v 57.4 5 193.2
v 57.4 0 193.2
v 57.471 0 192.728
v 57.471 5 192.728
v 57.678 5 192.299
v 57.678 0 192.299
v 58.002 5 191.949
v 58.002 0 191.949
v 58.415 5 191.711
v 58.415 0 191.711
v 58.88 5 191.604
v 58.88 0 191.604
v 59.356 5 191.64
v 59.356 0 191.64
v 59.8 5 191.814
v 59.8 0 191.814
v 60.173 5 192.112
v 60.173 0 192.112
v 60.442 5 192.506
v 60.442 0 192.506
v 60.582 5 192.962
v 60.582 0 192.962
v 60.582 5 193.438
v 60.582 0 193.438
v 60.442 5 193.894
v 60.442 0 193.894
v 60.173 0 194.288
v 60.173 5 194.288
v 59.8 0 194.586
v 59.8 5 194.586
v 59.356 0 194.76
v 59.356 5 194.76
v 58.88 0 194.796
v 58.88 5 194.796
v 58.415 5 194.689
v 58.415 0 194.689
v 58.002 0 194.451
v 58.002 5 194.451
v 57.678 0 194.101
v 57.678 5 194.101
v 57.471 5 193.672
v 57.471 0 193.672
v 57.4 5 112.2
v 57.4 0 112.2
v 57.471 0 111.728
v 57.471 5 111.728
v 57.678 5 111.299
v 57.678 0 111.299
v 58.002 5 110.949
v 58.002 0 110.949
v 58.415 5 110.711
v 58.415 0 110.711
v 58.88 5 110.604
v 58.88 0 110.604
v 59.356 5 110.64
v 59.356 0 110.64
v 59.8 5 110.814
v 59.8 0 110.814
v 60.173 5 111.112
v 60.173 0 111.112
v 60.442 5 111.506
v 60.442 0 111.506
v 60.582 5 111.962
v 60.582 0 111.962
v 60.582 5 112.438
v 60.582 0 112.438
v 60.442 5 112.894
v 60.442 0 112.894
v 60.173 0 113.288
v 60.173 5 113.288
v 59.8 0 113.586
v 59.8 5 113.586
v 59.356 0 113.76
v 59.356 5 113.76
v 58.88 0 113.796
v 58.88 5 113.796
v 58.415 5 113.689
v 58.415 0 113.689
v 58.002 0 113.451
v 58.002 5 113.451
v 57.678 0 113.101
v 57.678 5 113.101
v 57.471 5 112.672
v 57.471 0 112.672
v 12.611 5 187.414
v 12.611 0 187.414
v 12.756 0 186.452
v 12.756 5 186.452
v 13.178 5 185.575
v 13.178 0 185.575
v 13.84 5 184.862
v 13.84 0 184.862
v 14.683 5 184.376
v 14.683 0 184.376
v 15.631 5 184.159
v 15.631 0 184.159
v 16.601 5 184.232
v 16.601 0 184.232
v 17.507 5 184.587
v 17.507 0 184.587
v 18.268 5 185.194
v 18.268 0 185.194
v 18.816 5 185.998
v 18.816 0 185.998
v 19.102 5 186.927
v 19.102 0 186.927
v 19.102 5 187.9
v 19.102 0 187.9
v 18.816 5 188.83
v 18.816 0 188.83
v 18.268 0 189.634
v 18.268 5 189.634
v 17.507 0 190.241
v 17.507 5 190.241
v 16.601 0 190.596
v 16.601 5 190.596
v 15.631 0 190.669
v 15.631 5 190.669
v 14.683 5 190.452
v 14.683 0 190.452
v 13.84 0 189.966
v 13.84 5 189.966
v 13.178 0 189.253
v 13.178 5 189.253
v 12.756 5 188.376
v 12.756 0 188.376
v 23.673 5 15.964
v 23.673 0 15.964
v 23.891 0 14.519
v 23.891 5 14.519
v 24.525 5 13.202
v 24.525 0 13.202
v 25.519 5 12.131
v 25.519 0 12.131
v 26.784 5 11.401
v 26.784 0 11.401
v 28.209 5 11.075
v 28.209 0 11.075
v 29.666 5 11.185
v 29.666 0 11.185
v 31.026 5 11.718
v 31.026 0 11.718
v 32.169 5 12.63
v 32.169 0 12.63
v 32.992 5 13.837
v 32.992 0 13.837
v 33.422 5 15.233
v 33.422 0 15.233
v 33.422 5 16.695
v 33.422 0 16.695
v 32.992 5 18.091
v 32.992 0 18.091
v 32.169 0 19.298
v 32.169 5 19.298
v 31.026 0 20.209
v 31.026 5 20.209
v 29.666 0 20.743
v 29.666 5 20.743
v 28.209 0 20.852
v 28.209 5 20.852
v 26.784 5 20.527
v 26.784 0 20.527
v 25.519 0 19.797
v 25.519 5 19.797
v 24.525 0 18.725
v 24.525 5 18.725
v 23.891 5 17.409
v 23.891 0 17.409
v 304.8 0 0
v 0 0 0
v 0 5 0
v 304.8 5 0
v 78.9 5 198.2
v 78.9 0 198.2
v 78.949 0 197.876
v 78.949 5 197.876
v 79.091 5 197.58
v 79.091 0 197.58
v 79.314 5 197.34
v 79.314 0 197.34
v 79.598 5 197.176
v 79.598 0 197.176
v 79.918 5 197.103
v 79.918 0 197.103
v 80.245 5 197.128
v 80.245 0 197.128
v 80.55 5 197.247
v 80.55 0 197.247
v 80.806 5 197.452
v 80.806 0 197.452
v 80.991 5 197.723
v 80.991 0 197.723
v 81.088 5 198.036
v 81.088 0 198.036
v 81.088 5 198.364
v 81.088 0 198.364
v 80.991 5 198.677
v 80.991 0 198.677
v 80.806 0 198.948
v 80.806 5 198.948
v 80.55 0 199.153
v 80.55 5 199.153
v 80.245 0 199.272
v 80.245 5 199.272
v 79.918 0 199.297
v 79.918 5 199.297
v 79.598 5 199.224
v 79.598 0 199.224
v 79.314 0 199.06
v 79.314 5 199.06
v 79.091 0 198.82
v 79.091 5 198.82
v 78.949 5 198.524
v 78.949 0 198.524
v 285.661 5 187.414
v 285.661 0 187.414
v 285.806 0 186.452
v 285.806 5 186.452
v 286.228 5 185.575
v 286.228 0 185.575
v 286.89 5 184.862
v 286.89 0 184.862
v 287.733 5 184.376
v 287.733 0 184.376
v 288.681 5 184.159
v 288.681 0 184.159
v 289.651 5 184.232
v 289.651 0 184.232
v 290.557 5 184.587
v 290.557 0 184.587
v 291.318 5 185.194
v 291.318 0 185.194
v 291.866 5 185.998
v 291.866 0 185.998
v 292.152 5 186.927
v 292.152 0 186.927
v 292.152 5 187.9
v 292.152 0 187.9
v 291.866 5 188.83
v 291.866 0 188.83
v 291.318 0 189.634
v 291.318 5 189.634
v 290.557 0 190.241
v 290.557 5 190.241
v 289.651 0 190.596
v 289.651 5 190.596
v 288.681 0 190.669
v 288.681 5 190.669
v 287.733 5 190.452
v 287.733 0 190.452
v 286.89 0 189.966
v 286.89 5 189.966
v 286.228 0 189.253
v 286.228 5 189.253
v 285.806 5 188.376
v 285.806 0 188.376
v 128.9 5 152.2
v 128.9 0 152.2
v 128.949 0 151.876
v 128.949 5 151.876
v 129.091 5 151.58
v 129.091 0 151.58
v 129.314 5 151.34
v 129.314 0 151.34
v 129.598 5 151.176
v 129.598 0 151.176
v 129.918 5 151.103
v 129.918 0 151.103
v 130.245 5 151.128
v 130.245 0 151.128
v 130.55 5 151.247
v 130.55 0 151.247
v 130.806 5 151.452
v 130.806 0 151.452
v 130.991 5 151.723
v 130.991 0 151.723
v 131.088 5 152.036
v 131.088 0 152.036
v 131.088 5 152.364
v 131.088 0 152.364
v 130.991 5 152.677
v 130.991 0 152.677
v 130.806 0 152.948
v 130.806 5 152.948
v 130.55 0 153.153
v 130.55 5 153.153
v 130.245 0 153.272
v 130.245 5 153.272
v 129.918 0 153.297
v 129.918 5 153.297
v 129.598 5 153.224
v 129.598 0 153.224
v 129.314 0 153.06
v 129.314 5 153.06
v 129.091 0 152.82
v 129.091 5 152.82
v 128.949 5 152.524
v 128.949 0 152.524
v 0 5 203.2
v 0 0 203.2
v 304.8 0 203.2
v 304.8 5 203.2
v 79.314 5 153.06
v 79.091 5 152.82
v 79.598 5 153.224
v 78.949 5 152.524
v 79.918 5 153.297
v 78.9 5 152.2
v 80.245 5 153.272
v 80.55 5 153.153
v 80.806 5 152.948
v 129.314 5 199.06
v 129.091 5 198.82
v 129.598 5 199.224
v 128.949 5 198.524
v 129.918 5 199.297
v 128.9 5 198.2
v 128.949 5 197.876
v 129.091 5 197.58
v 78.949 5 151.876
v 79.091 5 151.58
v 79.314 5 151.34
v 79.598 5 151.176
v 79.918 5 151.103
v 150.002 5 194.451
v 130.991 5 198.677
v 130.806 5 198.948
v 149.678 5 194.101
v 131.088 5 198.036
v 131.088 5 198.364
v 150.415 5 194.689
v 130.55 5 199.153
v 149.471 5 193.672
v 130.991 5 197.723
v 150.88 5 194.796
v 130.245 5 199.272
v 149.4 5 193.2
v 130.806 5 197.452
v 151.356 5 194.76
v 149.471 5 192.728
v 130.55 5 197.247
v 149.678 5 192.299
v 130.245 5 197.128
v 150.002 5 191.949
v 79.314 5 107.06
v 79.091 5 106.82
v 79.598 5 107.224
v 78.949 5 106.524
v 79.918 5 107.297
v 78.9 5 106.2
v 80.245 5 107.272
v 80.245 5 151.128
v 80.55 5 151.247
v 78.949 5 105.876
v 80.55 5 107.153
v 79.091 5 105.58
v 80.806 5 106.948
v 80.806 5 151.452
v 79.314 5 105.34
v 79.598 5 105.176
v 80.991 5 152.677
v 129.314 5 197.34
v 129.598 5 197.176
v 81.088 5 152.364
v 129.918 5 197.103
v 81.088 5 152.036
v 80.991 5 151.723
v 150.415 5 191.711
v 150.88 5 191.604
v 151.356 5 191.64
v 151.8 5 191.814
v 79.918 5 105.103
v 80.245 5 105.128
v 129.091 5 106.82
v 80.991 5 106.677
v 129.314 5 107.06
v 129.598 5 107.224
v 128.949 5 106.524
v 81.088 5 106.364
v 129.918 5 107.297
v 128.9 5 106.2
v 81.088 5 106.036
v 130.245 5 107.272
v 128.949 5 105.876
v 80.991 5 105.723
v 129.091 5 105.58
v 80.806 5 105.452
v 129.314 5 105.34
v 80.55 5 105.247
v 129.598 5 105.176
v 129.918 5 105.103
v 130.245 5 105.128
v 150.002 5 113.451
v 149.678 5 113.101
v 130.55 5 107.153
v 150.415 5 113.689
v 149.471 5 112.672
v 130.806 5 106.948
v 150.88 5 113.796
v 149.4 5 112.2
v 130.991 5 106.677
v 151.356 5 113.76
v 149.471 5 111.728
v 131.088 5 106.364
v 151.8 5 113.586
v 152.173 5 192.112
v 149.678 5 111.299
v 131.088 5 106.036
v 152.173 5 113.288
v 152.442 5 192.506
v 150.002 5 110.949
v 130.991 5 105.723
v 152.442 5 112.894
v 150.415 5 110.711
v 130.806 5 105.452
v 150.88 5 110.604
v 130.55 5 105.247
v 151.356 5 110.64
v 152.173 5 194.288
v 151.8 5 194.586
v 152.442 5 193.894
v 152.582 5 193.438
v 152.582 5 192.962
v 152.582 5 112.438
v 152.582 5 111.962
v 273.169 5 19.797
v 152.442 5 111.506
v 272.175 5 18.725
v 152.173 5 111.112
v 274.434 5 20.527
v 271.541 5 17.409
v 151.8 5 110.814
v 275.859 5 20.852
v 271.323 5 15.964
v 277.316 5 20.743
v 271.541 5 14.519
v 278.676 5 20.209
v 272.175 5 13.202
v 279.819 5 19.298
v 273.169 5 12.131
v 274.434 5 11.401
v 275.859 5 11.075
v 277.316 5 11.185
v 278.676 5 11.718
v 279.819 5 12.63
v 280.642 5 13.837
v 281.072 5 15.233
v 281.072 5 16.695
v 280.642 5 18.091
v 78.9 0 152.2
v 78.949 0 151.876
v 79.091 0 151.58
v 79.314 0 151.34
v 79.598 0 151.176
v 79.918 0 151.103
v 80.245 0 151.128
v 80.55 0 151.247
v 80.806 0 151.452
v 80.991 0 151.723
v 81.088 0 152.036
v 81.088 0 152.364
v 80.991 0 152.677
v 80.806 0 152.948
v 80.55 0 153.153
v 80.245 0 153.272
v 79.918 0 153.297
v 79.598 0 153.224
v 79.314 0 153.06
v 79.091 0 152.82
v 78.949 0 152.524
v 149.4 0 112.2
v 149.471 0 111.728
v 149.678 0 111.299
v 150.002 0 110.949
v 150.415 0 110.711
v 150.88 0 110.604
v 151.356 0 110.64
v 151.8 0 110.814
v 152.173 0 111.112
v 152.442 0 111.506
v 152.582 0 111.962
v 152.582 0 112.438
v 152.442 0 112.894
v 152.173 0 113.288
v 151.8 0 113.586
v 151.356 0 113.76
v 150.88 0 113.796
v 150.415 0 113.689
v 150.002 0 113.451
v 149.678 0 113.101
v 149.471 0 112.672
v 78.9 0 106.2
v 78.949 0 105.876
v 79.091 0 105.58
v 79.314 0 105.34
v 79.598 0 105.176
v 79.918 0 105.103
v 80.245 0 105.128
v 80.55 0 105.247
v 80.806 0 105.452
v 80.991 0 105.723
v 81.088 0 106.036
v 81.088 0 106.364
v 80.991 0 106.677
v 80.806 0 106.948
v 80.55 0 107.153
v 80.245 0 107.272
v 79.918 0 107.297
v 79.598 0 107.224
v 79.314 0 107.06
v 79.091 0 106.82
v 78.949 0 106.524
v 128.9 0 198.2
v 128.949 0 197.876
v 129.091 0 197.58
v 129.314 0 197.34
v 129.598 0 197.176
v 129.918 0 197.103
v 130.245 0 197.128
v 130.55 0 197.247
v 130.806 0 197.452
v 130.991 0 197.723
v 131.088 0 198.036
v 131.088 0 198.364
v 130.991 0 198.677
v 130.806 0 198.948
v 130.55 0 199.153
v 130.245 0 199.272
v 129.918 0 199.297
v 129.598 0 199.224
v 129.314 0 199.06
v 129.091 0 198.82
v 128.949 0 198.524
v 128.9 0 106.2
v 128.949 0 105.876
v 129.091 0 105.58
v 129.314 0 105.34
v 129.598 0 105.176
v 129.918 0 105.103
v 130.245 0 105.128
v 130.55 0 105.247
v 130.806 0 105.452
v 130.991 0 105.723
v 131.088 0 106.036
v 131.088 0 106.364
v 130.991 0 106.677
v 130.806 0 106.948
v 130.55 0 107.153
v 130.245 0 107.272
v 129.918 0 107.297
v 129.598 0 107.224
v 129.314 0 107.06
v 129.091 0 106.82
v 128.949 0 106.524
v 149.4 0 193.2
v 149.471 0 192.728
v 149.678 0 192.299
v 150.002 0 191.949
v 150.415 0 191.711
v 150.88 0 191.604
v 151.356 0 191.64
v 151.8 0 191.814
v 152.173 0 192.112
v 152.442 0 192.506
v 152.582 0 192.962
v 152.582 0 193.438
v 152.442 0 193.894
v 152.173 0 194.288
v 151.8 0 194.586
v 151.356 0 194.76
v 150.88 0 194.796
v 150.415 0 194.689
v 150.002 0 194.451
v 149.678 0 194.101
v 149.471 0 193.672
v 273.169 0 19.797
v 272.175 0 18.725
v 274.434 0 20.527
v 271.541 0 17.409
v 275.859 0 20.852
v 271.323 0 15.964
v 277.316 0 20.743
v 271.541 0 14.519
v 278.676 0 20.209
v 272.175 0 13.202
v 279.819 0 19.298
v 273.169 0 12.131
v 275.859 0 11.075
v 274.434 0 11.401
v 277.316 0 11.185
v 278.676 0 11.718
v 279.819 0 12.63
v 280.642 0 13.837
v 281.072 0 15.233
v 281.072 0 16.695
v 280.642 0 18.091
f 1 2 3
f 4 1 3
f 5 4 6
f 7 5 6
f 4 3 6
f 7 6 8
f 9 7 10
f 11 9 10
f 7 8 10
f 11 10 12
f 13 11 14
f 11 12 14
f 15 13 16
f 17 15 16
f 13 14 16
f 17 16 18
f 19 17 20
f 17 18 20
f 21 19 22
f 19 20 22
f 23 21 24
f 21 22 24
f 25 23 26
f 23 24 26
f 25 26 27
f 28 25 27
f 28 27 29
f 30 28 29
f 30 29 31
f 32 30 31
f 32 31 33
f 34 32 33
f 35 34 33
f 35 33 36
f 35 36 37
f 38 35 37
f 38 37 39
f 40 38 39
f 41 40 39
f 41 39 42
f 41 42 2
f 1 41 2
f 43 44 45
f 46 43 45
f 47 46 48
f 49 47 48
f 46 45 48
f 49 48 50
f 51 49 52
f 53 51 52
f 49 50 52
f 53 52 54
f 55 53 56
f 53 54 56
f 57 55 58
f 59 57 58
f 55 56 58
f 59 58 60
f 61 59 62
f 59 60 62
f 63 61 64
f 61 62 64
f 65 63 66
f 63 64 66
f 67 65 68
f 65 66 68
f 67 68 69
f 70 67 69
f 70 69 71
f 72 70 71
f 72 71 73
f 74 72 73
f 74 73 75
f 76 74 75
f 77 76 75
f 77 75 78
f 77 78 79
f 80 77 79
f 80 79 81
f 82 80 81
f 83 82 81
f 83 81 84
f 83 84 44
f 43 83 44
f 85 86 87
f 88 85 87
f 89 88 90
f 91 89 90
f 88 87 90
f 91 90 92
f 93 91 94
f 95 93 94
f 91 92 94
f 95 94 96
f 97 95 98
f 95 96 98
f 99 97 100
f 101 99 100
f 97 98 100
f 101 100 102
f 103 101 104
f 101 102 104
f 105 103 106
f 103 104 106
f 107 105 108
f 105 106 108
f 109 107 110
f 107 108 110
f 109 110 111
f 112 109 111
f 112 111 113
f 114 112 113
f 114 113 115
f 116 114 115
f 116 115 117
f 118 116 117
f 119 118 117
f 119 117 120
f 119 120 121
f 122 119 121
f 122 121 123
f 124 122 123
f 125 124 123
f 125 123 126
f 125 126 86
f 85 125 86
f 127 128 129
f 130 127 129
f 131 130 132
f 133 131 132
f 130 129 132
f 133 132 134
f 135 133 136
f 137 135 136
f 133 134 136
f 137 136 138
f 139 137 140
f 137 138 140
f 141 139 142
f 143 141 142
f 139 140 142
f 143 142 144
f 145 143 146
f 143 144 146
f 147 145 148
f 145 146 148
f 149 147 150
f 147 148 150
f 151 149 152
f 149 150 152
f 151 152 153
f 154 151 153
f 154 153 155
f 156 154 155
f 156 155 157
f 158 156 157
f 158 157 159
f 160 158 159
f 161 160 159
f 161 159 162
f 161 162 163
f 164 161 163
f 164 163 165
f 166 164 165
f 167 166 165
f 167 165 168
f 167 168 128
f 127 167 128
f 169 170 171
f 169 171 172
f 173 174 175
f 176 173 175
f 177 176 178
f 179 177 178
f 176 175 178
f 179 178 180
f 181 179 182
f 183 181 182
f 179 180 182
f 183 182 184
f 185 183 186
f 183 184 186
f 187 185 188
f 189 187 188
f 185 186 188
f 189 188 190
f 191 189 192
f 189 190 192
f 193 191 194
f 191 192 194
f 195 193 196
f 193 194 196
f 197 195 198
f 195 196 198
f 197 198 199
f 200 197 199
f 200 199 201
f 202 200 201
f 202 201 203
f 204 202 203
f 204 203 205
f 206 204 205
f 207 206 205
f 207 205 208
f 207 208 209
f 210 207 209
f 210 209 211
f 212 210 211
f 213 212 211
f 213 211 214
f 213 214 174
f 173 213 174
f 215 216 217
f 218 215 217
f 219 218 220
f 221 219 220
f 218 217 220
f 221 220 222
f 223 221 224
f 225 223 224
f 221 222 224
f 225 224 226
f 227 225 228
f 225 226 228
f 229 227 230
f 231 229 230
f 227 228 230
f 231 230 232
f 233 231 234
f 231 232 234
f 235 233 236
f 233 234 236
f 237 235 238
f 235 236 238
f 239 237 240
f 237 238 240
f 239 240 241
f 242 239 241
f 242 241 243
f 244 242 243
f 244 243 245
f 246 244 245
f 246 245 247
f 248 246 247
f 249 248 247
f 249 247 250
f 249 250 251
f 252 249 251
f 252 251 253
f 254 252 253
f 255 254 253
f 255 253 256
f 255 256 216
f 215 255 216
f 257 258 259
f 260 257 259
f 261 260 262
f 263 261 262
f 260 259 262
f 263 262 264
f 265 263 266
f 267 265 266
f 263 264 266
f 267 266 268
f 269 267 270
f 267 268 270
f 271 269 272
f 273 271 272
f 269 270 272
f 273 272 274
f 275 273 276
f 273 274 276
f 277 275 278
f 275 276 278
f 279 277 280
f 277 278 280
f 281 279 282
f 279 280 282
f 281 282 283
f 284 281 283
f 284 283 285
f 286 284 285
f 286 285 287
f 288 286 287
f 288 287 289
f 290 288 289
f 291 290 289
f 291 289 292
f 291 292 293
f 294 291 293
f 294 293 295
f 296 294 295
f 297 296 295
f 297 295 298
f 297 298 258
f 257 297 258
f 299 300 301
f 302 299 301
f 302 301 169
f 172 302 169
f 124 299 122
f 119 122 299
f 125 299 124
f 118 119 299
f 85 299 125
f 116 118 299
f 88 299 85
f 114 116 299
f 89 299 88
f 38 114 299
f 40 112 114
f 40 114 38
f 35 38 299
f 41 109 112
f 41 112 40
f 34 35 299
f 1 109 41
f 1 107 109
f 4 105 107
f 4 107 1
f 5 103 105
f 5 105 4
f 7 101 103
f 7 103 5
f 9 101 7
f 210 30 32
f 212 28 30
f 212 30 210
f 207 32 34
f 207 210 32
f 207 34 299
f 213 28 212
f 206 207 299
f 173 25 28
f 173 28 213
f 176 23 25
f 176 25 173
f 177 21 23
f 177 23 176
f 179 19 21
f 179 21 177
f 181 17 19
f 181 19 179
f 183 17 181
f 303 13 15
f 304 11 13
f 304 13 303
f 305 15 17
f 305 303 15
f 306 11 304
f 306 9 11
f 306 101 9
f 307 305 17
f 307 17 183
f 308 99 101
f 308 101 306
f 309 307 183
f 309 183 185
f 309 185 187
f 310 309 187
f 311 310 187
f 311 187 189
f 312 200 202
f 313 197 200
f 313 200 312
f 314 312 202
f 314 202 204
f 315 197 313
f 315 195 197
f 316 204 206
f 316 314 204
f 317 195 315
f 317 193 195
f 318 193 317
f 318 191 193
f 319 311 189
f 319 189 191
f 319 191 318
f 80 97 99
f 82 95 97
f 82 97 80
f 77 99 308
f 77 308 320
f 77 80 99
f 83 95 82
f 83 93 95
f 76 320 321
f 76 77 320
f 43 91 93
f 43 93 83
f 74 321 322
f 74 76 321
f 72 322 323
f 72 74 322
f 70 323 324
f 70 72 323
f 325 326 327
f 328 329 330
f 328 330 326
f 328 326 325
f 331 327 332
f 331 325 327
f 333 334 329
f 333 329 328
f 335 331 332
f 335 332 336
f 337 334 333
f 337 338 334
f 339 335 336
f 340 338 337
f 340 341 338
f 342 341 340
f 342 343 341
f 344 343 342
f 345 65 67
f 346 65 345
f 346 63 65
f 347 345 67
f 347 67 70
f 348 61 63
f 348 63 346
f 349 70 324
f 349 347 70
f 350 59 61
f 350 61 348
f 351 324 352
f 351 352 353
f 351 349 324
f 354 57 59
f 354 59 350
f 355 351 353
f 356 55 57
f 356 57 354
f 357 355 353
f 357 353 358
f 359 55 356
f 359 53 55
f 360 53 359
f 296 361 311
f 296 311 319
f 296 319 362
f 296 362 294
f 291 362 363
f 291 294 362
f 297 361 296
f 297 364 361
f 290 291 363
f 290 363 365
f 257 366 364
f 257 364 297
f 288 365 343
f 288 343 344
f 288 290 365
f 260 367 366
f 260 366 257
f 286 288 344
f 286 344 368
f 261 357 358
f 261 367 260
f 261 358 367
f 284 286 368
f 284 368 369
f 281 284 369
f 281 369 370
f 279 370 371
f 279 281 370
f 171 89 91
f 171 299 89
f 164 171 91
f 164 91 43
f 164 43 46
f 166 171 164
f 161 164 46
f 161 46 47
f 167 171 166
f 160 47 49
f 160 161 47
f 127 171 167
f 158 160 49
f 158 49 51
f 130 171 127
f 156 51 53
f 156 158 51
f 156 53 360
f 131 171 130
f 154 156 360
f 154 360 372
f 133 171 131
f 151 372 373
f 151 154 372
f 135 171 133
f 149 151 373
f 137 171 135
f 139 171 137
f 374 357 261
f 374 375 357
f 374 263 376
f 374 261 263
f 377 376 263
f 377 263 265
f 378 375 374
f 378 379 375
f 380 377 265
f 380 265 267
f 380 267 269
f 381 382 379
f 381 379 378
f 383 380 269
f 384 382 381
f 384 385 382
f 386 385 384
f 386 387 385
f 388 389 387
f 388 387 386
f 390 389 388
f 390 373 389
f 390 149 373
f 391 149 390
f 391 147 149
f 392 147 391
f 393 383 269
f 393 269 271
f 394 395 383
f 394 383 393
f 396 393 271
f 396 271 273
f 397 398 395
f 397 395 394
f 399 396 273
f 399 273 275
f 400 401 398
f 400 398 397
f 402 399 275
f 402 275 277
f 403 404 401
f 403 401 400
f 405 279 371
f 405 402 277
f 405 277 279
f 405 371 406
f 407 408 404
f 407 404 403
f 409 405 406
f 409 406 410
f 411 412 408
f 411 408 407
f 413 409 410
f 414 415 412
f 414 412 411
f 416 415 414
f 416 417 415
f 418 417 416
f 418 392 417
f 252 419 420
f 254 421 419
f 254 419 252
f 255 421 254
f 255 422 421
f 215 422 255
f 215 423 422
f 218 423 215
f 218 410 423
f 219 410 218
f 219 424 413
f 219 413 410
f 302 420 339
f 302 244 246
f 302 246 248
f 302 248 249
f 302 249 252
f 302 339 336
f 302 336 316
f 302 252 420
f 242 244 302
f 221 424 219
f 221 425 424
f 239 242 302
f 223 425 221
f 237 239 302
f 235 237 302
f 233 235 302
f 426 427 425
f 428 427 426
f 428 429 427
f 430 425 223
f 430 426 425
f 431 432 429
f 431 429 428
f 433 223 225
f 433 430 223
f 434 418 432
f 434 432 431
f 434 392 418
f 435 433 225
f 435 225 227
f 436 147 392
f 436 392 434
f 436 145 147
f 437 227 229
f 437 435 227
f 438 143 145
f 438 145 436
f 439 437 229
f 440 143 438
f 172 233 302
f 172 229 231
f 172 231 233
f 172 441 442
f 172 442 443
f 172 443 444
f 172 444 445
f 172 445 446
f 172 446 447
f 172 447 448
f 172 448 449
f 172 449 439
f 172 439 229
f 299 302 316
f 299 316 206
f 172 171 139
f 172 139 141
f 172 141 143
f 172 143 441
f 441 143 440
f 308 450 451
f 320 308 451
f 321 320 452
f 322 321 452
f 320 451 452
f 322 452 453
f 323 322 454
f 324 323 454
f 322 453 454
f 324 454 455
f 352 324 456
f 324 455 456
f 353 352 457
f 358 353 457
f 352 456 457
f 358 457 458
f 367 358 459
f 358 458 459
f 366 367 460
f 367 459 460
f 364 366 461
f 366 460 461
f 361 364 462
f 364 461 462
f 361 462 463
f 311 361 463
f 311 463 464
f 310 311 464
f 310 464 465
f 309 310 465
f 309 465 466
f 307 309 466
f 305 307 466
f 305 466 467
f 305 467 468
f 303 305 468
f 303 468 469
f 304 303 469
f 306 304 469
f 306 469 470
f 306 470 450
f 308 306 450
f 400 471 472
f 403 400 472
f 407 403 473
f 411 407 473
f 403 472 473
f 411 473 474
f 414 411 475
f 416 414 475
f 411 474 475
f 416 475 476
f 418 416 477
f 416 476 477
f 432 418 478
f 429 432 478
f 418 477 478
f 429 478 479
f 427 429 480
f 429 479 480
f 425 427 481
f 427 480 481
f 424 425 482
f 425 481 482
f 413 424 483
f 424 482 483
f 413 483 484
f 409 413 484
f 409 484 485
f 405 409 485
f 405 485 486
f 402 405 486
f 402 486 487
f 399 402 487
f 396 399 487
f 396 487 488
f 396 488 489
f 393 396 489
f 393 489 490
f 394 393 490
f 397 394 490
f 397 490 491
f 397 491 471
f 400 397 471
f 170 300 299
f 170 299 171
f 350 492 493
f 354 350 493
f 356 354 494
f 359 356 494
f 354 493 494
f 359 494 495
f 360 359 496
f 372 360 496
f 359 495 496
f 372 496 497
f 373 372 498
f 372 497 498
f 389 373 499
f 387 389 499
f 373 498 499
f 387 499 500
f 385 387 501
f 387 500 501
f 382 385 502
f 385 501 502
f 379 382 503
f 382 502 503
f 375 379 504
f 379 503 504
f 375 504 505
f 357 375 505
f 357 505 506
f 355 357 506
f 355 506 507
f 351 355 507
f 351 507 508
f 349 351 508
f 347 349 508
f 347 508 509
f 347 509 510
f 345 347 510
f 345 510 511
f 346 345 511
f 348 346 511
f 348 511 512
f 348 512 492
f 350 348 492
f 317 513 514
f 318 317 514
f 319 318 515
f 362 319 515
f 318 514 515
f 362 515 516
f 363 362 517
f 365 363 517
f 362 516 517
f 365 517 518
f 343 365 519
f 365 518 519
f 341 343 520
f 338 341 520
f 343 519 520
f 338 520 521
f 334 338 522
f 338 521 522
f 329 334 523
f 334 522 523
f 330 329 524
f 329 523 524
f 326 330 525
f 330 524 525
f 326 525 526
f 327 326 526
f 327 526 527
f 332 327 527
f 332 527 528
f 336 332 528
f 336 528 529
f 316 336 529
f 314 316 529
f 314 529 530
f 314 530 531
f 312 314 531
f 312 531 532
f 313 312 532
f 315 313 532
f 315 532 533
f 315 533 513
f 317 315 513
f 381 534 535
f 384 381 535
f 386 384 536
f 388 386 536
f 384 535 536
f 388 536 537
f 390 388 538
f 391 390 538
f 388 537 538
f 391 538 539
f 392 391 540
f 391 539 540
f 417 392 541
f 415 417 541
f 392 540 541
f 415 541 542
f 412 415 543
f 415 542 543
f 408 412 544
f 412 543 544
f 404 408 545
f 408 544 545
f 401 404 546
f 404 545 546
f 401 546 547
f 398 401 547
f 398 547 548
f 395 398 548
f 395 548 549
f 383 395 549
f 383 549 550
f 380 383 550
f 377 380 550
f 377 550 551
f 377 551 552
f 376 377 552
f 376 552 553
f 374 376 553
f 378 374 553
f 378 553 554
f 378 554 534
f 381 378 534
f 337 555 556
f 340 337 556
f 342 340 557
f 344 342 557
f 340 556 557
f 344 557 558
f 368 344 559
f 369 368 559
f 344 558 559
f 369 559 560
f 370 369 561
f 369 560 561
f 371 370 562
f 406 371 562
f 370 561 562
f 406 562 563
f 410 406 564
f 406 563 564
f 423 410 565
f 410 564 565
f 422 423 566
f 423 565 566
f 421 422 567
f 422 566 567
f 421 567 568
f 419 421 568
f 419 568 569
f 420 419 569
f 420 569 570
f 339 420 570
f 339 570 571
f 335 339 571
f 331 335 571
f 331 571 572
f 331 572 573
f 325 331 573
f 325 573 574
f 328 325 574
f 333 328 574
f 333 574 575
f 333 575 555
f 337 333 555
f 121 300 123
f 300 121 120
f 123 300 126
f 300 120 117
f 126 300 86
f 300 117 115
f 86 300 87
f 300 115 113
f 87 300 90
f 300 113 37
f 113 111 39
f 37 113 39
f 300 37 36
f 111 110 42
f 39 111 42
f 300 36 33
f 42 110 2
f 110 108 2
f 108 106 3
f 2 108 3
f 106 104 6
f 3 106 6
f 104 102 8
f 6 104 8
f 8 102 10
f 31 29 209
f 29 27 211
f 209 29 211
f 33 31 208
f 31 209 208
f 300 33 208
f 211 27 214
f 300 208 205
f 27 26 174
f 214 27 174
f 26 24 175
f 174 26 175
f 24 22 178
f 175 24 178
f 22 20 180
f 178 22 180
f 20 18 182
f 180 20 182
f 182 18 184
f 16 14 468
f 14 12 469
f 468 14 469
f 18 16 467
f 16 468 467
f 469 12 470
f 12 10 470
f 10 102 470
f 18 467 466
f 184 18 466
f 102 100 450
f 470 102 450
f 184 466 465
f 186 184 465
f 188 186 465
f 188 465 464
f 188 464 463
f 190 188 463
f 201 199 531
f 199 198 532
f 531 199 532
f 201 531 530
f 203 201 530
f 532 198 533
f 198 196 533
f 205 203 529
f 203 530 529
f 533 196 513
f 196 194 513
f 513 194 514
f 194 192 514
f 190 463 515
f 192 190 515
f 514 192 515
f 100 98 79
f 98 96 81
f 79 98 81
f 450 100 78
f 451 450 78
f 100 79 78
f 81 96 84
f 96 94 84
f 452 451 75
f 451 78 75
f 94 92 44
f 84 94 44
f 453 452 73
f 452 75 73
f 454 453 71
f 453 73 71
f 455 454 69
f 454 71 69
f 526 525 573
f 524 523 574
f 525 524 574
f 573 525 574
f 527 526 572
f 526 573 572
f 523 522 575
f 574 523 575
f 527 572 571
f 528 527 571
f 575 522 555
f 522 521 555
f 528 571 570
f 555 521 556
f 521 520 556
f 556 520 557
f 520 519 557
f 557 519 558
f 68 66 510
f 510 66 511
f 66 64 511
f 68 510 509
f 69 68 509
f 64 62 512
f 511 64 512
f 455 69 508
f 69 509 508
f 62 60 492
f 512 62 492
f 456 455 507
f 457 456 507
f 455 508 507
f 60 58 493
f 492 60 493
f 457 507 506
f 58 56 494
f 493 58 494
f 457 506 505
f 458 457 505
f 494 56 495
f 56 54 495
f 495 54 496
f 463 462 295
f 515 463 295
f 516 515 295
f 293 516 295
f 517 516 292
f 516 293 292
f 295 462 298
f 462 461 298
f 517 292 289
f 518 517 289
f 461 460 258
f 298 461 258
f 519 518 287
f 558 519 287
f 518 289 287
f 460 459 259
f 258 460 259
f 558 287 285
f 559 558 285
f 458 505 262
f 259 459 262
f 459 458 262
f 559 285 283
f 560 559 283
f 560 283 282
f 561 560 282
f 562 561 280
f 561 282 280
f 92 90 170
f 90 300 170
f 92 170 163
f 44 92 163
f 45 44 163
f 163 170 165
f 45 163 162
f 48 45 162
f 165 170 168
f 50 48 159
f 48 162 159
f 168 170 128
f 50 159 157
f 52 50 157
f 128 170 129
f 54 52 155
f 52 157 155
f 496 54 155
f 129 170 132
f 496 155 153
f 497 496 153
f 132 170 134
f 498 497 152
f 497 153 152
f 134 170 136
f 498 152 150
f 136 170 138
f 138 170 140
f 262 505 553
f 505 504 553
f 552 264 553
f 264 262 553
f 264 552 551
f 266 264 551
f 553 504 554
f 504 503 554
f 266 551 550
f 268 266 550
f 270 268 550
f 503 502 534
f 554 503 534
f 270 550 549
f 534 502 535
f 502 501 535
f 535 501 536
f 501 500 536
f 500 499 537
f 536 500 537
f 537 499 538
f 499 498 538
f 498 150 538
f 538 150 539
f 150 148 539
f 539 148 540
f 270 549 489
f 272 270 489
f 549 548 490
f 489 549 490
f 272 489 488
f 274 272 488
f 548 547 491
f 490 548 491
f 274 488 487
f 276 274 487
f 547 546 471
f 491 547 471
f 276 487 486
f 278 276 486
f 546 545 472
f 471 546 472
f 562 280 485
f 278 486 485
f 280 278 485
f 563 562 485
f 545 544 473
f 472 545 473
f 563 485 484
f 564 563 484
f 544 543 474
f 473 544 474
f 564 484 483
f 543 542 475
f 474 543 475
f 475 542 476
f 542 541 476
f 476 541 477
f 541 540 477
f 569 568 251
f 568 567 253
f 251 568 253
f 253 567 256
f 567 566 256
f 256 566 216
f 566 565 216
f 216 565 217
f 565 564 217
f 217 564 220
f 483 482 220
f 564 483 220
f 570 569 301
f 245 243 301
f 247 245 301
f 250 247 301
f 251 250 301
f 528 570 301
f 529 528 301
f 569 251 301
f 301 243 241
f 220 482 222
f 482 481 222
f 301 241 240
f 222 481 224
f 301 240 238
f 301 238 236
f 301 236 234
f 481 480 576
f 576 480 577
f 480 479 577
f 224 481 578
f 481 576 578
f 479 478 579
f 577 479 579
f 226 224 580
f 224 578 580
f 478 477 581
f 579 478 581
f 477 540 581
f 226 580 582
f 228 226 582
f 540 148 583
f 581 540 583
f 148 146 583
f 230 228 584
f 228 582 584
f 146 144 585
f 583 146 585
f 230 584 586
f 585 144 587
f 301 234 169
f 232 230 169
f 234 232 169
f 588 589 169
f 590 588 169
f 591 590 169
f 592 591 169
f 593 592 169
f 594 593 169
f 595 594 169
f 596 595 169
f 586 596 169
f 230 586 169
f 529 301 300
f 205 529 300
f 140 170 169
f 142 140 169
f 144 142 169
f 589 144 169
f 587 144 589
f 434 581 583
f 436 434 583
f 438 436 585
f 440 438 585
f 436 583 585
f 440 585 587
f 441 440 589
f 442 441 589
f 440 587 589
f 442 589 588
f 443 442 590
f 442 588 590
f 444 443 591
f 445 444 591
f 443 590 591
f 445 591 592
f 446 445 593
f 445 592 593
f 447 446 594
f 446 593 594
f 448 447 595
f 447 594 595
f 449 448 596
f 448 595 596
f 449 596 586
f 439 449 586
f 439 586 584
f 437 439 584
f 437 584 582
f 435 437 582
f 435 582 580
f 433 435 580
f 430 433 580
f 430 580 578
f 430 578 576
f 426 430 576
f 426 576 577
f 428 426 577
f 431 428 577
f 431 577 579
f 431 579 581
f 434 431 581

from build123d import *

# Parameters (mm, degrees)
SKETCH1_W                       = 304.8
SKETCH1_H                       = 203.2
BOSS_EXTRUDE1_DEPTH             = 5
CLEARANCE_HOLES_FOR_LED_PANEL_D = 2.2
M3_CLEARANCE_HOLE1_D            = 3.2
F_1_4_CLEARANCE_HOLE1_D         = 6.5278
F_3_8_CLEARANCE_HOLE1_D         = 9.8044


with BuildPart() as part:
    # Sketch1 → Boss-Extrude1 (new body)
    with BuildSketch(Plane(origin=(0, 0, 0), x_dir=(1, 0, 0), z_dir=(0, 1, 0))):
        with Locations((152.4, -101.6)):
            Rectangle(SKETCH1_W, SKETCH1_H)
    extrude(amount=BOSS_EXTRUDE1_DEPTH)

    # clearance holes for led panel (through all)
    with Locations(Plane(origin=(0, 5, 0), x_dir=(1, 0, 0), z_dir=(0, 1, 0))):
        with Locations((80, -106.2), (130, -106.2), (130, -152.2), (80, -152.2), (80, -198.2), (130, -198.2)):
            Hole(CLEARANCE_HOLES_FOR_LED_PANEL_D / 2)

    # M3 Clearance Hole1 (through all)
    with Locations(Plane(origin=(0, 5, 0), x_dir=(1, 0, 0), z_dir=(0, 1, 0))):
        with Locations((59, -112.2), (151, -112.2), (151, -193.2), (59, -193.2)):
            Hole(M3_CLEARANCE_HOLE1_D / 2)

    # 1/4 Clearance Hole1 (through all)
    with Locations(Plane(origin=(0, 5, 0), x_dir=(1, 0, 0), z_dir=(0, 1, 0))):
        with Locations((15.875, -187.4139), (288.925, -187.4139)):
            Hole(F_1_4_CLEARANCE_HOLE1_D / 2)

    # 3/8 Clearance Hole1 (through all)
    with Locations(Plane(origin=(0, 5, 0), x_dir=(1, 0, 0), z_dir=(0, 1, 0))):
        with Locations((28.575, -15.9639), (276.225, -15.9639)):
            Hole(F_3_8_CLEARANCE_HOLE1_D / 2)


solid = part.part
